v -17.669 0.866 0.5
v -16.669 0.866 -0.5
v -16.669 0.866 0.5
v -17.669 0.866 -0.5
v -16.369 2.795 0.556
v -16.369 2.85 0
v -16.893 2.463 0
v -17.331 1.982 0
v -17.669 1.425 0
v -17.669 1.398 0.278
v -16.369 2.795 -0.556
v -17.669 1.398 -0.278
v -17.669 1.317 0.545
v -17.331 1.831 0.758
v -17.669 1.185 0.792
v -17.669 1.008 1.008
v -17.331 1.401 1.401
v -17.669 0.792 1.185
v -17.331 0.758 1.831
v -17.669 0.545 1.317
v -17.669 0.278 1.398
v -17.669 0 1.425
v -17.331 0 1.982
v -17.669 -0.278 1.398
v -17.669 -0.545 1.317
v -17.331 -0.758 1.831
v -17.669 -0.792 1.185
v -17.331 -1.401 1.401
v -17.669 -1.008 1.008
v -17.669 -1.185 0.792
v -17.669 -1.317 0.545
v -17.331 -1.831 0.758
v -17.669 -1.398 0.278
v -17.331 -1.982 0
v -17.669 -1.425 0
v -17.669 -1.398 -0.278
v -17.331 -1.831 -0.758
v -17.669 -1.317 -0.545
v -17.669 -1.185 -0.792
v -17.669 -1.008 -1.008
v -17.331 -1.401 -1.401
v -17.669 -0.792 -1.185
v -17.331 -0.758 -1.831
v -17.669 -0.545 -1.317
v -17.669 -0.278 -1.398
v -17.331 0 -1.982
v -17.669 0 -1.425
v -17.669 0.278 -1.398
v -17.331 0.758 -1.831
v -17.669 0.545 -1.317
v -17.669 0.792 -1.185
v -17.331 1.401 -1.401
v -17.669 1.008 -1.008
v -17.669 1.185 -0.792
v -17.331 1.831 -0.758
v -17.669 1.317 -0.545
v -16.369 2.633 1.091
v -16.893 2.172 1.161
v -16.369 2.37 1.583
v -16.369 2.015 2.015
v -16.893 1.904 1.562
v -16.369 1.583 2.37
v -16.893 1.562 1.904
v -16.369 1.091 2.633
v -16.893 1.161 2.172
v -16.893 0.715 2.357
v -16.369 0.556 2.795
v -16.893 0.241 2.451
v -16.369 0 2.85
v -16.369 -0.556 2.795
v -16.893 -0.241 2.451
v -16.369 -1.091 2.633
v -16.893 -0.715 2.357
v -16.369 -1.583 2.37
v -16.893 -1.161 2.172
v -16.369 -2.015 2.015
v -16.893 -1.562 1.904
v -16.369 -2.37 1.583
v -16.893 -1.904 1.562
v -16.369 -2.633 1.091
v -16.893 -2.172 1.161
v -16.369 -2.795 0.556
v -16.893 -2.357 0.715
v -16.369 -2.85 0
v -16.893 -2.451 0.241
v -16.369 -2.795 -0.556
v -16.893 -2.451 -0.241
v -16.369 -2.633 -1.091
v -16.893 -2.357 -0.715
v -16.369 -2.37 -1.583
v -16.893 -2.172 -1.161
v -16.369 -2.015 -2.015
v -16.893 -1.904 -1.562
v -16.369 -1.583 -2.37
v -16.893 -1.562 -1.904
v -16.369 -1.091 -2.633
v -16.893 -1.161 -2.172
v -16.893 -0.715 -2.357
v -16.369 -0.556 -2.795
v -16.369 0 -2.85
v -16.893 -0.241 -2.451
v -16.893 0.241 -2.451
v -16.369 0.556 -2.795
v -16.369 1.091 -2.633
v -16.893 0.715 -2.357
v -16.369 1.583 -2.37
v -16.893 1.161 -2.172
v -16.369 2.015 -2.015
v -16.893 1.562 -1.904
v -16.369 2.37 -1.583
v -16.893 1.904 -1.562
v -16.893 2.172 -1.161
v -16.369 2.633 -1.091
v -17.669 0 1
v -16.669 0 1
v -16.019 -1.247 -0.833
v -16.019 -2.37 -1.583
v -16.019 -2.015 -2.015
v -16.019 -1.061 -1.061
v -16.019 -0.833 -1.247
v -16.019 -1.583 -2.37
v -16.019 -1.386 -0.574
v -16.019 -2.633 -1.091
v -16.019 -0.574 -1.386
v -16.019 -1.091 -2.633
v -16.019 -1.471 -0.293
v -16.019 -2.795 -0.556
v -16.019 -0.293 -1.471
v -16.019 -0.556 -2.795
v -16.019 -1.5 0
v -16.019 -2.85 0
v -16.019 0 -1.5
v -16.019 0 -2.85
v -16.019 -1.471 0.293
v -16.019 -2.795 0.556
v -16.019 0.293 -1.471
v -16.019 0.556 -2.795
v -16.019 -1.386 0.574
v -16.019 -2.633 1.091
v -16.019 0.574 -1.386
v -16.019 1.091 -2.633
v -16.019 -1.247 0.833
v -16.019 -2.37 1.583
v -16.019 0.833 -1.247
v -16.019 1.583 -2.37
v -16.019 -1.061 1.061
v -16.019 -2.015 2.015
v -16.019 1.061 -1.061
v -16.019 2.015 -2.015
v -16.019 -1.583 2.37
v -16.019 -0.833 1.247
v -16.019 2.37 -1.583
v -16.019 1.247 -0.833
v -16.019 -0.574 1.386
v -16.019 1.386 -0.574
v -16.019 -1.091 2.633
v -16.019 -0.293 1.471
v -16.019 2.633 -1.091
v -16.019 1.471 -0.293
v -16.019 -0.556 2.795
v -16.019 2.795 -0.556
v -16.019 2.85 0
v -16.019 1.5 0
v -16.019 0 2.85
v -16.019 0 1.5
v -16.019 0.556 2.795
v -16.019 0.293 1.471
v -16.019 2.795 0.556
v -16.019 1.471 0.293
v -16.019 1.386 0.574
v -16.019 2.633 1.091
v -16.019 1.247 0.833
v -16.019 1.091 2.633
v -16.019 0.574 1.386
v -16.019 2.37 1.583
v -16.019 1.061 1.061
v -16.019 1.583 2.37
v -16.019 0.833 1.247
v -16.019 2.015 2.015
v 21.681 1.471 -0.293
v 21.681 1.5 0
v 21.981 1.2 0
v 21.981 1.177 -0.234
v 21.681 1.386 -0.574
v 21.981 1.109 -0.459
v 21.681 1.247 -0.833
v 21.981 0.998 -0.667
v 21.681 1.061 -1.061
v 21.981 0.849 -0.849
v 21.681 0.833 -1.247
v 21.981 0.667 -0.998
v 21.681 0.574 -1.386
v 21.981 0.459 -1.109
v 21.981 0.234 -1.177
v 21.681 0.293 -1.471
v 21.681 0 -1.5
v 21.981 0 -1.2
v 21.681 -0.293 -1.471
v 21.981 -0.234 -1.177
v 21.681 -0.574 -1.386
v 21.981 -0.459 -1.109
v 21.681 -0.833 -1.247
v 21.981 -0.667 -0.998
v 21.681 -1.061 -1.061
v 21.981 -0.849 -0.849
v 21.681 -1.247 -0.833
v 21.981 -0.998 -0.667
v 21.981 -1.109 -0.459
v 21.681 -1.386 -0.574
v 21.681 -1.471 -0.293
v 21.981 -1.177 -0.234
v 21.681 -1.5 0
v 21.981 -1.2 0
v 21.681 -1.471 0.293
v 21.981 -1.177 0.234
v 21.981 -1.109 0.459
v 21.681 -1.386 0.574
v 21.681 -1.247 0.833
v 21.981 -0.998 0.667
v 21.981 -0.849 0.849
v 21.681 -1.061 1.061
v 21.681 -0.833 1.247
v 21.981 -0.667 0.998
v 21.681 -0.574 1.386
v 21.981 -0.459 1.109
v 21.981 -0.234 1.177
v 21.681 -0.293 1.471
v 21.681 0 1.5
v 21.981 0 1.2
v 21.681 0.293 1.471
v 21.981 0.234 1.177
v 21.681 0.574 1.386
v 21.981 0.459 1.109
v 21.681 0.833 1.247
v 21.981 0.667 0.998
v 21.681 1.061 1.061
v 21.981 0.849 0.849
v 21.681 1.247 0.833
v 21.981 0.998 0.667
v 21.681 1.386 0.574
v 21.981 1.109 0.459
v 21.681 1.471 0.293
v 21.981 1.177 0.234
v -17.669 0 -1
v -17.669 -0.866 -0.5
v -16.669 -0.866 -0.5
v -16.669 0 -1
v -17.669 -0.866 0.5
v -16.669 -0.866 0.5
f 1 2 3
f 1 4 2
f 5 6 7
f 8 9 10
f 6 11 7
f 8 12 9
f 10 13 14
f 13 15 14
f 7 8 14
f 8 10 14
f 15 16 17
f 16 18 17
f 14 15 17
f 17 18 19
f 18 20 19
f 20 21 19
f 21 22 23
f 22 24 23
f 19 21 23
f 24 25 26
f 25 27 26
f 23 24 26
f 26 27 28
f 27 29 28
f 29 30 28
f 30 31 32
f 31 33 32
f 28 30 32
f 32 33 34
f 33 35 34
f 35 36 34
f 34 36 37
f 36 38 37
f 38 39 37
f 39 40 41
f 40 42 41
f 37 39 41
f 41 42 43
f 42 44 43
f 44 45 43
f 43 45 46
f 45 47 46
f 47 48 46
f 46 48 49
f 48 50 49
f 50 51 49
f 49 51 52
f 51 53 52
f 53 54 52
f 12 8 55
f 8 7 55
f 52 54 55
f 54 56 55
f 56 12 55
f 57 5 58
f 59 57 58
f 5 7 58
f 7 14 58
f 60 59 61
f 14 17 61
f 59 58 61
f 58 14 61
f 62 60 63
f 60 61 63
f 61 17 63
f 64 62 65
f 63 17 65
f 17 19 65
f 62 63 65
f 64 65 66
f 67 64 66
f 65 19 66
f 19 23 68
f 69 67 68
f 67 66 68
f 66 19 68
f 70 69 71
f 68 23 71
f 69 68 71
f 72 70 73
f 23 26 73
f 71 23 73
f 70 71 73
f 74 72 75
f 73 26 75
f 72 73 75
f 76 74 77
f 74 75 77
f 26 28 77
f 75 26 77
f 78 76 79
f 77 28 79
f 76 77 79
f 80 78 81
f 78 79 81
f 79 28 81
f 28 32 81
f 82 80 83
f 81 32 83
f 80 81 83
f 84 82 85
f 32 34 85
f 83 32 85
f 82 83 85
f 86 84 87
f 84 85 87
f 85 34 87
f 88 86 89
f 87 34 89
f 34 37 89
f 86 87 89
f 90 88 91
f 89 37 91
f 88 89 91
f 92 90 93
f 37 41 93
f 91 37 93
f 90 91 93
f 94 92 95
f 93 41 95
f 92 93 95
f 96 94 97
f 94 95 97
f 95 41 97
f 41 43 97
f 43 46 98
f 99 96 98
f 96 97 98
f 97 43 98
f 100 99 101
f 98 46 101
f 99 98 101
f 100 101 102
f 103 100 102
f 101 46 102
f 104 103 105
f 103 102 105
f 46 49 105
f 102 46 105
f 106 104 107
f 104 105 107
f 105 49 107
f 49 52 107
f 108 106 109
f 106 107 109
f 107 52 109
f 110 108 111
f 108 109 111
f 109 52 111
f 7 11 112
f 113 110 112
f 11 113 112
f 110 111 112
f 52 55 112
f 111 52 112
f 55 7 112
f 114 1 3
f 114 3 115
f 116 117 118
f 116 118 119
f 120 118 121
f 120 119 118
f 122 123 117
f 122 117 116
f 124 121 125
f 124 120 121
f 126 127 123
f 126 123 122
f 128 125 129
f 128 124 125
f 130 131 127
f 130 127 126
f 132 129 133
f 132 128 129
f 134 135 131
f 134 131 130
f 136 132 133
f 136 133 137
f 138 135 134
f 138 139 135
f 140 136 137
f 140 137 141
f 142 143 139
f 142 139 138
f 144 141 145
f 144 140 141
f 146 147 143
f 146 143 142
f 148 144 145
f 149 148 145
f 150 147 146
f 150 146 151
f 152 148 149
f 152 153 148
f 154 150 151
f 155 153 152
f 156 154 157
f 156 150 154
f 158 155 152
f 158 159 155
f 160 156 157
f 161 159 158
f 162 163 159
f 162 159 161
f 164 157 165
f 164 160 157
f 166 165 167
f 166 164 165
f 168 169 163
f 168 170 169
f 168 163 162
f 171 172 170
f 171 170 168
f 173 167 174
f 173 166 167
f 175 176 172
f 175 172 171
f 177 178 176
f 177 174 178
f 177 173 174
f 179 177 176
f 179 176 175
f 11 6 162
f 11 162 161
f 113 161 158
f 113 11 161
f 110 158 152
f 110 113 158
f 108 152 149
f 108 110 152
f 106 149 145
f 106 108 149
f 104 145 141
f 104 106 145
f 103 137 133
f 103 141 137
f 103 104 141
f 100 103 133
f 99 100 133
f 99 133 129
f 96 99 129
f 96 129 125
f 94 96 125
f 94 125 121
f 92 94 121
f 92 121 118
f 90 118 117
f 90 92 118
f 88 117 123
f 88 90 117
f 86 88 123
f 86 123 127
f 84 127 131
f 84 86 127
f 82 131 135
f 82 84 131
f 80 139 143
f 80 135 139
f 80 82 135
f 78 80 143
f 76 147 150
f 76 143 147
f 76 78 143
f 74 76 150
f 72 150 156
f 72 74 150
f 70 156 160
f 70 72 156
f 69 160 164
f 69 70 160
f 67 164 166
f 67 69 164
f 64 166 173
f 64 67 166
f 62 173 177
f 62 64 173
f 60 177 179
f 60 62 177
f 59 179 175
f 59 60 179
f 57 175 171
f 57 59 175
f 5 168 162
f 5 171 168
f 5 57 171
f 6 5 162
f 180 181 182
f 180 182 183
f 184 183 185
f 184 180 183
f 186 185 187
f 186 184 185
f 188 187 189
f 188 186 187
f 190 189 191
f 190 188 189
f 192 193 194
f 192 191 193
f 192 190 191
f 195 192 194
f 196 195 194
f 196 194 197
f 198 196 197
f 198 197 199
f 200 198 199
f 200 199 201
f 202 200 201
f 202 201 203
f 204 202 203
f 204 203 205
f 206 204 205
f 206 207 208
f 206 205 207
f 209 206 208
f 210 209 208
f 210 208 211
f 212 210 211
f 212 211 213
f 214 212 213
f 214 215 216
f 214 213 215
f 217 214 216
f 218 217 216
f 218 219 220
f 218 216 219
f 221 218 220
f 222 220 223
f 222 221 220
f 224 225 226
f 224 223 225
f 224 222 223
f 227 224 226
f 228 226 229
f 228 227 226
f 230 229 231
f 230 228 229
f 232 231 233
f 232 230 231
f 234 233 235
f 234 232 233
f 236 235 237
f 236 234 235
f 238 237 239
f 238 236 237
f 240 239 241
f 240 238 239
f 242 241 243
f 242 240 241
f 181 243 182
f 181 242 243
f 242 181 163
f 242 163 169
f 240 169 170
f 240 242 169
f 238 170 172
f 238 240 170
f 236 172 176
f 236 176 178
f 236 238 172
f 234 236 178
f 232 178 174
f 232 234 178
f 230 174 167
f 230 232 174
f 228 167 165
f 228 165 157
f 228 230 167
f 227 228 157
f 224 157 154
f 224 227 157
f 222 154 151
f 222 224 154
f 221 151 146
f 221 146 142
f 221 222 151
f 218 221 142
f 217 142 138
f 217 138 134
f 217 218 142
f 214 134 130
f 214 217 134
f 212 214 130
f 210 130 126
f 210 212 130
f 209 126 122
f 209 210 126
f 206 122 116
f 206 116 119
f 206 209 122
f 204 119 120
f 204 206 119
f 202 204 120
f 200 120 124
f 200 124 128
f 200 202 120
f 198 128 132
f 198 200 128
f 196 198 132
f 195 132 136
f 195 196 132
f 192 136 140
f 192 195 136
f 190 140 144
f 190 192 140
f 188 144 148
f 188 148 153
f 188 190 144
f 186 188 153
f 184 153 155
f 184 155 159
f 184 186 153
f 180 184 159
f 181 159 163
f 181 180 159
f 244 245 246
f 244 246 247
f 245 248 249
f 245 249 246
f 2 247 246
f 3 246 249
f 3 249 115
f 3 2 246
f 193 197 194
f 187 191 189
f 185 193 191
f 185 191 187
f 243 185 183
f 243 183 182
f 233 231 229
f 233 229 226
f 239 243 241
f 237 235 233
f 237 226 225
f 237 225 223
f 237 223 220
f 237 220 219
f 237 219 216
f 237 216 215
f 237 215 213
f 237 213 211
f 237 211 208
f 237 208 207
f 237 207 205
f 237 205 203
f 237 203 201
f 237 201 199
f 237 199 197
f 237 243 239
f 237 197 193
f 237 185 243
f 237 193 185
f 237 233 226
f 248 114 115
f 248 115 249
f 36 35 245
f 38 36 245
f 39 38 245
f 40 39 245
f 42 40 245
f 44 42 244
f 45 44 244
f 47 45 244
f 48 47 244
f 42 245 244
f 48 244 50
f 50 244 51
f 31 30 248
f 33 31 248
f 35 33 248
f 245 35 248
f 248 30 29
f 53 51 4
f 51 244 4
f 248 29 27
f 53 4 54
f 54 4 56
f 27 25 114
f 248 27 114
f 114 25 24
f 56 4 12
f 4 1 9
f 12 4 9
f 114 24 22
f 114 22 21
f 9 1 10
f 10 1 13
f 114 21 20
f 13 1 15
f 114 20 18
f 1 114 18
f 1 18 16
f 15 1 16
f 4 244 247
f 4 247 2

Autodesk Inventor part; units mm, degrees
ref_plane "YZ Plane" through (0, 0, 0) normal (1, 0, 0) x (0, 1, 0)
ref_plane "XZ Plane" through (0, 0, 0) normal (0, 1, 0) x (-1, 0, 0)
ref_plane "XY Plane" through (0, 0, 0) normal (0, 0, 1) x (1, 0, 0)
sketch "Sketch1" plane through (0, 0, 0) normal (0, 0, 1) x (1, 0, 0)
  line L0 (-16.019, 0) -> (21.981, 0)
  line L1 (-16.019, 1.5) -> (21.681, 1.5)
  line L2 (-16.019, 0) -> (-16.019, 2.85)
  line L3 (-17.669, 0) -> (-17.669, 1.425)
  line L4 (21.981, 1.2) -> (21.981, 0)
  line L5 (-16.369, 0) -> (-16.369, 2.85)
  line L6 (-16.019, 2.85) -> (-16.369, 2.85)
  arc A0 (-16.369, 2.85) -> (-17.669, 1.425) centre (-14.6489, -0.0247) ccw
  line L7 (21.681, 1.5) -> (21.981, 1.2)
  line L8 (-16.019, 0) -> (-17.669, 0)
  point P0 (0, 0)
  point P1 (21.981, 1.5)
  dimension "d0" = 38
  dimension "d1" = 1.5
  dimension "d2" = 2.85
  dimension "d3" = 1.425
  dimension "d4" = 1.65
  dimension "d5" = 2.85
  dimension "d6" = 0.35
  dimension "d7" = 3.35
  dimension "d8" = 0.3
  dimension "d9" = 45
revolve "Revolution1" add sketch "Sketch1" angle 360 about axis through (-16.019, 0, 0) along (1, 0, 0)
sketch "Sketch2" plane through (-17.669, 0, 0) normal (-1, 0, 0) x (0, 0, 1)
  line L0 (-1, 0) -> (-0.5, 0.866)
  line L1 (-0.5, 0.866) -> (0.5, 0.866)
  line L2 (0.5, 0.866) -> (1, 0)
  line L3 (1, 0) -> (0.5, -0.866)
  line L4 (0.5, -0.866) -> (-0.5, -0.866)
  line L5 (-0.5, -0.866) -> (-1, 0)
  point P0 (0, 0)
  point P1 (0, 0)
  dimension "d11" = 2
extrude "Extrusion1" cut sketch "Sketch2" against normal blind 1
thread "Thread1" size "M3x0.5" class "6g" standard "ANSI Metric M Profile" full length
properties part number "bolt" material "Steel, Mild, Welded"
